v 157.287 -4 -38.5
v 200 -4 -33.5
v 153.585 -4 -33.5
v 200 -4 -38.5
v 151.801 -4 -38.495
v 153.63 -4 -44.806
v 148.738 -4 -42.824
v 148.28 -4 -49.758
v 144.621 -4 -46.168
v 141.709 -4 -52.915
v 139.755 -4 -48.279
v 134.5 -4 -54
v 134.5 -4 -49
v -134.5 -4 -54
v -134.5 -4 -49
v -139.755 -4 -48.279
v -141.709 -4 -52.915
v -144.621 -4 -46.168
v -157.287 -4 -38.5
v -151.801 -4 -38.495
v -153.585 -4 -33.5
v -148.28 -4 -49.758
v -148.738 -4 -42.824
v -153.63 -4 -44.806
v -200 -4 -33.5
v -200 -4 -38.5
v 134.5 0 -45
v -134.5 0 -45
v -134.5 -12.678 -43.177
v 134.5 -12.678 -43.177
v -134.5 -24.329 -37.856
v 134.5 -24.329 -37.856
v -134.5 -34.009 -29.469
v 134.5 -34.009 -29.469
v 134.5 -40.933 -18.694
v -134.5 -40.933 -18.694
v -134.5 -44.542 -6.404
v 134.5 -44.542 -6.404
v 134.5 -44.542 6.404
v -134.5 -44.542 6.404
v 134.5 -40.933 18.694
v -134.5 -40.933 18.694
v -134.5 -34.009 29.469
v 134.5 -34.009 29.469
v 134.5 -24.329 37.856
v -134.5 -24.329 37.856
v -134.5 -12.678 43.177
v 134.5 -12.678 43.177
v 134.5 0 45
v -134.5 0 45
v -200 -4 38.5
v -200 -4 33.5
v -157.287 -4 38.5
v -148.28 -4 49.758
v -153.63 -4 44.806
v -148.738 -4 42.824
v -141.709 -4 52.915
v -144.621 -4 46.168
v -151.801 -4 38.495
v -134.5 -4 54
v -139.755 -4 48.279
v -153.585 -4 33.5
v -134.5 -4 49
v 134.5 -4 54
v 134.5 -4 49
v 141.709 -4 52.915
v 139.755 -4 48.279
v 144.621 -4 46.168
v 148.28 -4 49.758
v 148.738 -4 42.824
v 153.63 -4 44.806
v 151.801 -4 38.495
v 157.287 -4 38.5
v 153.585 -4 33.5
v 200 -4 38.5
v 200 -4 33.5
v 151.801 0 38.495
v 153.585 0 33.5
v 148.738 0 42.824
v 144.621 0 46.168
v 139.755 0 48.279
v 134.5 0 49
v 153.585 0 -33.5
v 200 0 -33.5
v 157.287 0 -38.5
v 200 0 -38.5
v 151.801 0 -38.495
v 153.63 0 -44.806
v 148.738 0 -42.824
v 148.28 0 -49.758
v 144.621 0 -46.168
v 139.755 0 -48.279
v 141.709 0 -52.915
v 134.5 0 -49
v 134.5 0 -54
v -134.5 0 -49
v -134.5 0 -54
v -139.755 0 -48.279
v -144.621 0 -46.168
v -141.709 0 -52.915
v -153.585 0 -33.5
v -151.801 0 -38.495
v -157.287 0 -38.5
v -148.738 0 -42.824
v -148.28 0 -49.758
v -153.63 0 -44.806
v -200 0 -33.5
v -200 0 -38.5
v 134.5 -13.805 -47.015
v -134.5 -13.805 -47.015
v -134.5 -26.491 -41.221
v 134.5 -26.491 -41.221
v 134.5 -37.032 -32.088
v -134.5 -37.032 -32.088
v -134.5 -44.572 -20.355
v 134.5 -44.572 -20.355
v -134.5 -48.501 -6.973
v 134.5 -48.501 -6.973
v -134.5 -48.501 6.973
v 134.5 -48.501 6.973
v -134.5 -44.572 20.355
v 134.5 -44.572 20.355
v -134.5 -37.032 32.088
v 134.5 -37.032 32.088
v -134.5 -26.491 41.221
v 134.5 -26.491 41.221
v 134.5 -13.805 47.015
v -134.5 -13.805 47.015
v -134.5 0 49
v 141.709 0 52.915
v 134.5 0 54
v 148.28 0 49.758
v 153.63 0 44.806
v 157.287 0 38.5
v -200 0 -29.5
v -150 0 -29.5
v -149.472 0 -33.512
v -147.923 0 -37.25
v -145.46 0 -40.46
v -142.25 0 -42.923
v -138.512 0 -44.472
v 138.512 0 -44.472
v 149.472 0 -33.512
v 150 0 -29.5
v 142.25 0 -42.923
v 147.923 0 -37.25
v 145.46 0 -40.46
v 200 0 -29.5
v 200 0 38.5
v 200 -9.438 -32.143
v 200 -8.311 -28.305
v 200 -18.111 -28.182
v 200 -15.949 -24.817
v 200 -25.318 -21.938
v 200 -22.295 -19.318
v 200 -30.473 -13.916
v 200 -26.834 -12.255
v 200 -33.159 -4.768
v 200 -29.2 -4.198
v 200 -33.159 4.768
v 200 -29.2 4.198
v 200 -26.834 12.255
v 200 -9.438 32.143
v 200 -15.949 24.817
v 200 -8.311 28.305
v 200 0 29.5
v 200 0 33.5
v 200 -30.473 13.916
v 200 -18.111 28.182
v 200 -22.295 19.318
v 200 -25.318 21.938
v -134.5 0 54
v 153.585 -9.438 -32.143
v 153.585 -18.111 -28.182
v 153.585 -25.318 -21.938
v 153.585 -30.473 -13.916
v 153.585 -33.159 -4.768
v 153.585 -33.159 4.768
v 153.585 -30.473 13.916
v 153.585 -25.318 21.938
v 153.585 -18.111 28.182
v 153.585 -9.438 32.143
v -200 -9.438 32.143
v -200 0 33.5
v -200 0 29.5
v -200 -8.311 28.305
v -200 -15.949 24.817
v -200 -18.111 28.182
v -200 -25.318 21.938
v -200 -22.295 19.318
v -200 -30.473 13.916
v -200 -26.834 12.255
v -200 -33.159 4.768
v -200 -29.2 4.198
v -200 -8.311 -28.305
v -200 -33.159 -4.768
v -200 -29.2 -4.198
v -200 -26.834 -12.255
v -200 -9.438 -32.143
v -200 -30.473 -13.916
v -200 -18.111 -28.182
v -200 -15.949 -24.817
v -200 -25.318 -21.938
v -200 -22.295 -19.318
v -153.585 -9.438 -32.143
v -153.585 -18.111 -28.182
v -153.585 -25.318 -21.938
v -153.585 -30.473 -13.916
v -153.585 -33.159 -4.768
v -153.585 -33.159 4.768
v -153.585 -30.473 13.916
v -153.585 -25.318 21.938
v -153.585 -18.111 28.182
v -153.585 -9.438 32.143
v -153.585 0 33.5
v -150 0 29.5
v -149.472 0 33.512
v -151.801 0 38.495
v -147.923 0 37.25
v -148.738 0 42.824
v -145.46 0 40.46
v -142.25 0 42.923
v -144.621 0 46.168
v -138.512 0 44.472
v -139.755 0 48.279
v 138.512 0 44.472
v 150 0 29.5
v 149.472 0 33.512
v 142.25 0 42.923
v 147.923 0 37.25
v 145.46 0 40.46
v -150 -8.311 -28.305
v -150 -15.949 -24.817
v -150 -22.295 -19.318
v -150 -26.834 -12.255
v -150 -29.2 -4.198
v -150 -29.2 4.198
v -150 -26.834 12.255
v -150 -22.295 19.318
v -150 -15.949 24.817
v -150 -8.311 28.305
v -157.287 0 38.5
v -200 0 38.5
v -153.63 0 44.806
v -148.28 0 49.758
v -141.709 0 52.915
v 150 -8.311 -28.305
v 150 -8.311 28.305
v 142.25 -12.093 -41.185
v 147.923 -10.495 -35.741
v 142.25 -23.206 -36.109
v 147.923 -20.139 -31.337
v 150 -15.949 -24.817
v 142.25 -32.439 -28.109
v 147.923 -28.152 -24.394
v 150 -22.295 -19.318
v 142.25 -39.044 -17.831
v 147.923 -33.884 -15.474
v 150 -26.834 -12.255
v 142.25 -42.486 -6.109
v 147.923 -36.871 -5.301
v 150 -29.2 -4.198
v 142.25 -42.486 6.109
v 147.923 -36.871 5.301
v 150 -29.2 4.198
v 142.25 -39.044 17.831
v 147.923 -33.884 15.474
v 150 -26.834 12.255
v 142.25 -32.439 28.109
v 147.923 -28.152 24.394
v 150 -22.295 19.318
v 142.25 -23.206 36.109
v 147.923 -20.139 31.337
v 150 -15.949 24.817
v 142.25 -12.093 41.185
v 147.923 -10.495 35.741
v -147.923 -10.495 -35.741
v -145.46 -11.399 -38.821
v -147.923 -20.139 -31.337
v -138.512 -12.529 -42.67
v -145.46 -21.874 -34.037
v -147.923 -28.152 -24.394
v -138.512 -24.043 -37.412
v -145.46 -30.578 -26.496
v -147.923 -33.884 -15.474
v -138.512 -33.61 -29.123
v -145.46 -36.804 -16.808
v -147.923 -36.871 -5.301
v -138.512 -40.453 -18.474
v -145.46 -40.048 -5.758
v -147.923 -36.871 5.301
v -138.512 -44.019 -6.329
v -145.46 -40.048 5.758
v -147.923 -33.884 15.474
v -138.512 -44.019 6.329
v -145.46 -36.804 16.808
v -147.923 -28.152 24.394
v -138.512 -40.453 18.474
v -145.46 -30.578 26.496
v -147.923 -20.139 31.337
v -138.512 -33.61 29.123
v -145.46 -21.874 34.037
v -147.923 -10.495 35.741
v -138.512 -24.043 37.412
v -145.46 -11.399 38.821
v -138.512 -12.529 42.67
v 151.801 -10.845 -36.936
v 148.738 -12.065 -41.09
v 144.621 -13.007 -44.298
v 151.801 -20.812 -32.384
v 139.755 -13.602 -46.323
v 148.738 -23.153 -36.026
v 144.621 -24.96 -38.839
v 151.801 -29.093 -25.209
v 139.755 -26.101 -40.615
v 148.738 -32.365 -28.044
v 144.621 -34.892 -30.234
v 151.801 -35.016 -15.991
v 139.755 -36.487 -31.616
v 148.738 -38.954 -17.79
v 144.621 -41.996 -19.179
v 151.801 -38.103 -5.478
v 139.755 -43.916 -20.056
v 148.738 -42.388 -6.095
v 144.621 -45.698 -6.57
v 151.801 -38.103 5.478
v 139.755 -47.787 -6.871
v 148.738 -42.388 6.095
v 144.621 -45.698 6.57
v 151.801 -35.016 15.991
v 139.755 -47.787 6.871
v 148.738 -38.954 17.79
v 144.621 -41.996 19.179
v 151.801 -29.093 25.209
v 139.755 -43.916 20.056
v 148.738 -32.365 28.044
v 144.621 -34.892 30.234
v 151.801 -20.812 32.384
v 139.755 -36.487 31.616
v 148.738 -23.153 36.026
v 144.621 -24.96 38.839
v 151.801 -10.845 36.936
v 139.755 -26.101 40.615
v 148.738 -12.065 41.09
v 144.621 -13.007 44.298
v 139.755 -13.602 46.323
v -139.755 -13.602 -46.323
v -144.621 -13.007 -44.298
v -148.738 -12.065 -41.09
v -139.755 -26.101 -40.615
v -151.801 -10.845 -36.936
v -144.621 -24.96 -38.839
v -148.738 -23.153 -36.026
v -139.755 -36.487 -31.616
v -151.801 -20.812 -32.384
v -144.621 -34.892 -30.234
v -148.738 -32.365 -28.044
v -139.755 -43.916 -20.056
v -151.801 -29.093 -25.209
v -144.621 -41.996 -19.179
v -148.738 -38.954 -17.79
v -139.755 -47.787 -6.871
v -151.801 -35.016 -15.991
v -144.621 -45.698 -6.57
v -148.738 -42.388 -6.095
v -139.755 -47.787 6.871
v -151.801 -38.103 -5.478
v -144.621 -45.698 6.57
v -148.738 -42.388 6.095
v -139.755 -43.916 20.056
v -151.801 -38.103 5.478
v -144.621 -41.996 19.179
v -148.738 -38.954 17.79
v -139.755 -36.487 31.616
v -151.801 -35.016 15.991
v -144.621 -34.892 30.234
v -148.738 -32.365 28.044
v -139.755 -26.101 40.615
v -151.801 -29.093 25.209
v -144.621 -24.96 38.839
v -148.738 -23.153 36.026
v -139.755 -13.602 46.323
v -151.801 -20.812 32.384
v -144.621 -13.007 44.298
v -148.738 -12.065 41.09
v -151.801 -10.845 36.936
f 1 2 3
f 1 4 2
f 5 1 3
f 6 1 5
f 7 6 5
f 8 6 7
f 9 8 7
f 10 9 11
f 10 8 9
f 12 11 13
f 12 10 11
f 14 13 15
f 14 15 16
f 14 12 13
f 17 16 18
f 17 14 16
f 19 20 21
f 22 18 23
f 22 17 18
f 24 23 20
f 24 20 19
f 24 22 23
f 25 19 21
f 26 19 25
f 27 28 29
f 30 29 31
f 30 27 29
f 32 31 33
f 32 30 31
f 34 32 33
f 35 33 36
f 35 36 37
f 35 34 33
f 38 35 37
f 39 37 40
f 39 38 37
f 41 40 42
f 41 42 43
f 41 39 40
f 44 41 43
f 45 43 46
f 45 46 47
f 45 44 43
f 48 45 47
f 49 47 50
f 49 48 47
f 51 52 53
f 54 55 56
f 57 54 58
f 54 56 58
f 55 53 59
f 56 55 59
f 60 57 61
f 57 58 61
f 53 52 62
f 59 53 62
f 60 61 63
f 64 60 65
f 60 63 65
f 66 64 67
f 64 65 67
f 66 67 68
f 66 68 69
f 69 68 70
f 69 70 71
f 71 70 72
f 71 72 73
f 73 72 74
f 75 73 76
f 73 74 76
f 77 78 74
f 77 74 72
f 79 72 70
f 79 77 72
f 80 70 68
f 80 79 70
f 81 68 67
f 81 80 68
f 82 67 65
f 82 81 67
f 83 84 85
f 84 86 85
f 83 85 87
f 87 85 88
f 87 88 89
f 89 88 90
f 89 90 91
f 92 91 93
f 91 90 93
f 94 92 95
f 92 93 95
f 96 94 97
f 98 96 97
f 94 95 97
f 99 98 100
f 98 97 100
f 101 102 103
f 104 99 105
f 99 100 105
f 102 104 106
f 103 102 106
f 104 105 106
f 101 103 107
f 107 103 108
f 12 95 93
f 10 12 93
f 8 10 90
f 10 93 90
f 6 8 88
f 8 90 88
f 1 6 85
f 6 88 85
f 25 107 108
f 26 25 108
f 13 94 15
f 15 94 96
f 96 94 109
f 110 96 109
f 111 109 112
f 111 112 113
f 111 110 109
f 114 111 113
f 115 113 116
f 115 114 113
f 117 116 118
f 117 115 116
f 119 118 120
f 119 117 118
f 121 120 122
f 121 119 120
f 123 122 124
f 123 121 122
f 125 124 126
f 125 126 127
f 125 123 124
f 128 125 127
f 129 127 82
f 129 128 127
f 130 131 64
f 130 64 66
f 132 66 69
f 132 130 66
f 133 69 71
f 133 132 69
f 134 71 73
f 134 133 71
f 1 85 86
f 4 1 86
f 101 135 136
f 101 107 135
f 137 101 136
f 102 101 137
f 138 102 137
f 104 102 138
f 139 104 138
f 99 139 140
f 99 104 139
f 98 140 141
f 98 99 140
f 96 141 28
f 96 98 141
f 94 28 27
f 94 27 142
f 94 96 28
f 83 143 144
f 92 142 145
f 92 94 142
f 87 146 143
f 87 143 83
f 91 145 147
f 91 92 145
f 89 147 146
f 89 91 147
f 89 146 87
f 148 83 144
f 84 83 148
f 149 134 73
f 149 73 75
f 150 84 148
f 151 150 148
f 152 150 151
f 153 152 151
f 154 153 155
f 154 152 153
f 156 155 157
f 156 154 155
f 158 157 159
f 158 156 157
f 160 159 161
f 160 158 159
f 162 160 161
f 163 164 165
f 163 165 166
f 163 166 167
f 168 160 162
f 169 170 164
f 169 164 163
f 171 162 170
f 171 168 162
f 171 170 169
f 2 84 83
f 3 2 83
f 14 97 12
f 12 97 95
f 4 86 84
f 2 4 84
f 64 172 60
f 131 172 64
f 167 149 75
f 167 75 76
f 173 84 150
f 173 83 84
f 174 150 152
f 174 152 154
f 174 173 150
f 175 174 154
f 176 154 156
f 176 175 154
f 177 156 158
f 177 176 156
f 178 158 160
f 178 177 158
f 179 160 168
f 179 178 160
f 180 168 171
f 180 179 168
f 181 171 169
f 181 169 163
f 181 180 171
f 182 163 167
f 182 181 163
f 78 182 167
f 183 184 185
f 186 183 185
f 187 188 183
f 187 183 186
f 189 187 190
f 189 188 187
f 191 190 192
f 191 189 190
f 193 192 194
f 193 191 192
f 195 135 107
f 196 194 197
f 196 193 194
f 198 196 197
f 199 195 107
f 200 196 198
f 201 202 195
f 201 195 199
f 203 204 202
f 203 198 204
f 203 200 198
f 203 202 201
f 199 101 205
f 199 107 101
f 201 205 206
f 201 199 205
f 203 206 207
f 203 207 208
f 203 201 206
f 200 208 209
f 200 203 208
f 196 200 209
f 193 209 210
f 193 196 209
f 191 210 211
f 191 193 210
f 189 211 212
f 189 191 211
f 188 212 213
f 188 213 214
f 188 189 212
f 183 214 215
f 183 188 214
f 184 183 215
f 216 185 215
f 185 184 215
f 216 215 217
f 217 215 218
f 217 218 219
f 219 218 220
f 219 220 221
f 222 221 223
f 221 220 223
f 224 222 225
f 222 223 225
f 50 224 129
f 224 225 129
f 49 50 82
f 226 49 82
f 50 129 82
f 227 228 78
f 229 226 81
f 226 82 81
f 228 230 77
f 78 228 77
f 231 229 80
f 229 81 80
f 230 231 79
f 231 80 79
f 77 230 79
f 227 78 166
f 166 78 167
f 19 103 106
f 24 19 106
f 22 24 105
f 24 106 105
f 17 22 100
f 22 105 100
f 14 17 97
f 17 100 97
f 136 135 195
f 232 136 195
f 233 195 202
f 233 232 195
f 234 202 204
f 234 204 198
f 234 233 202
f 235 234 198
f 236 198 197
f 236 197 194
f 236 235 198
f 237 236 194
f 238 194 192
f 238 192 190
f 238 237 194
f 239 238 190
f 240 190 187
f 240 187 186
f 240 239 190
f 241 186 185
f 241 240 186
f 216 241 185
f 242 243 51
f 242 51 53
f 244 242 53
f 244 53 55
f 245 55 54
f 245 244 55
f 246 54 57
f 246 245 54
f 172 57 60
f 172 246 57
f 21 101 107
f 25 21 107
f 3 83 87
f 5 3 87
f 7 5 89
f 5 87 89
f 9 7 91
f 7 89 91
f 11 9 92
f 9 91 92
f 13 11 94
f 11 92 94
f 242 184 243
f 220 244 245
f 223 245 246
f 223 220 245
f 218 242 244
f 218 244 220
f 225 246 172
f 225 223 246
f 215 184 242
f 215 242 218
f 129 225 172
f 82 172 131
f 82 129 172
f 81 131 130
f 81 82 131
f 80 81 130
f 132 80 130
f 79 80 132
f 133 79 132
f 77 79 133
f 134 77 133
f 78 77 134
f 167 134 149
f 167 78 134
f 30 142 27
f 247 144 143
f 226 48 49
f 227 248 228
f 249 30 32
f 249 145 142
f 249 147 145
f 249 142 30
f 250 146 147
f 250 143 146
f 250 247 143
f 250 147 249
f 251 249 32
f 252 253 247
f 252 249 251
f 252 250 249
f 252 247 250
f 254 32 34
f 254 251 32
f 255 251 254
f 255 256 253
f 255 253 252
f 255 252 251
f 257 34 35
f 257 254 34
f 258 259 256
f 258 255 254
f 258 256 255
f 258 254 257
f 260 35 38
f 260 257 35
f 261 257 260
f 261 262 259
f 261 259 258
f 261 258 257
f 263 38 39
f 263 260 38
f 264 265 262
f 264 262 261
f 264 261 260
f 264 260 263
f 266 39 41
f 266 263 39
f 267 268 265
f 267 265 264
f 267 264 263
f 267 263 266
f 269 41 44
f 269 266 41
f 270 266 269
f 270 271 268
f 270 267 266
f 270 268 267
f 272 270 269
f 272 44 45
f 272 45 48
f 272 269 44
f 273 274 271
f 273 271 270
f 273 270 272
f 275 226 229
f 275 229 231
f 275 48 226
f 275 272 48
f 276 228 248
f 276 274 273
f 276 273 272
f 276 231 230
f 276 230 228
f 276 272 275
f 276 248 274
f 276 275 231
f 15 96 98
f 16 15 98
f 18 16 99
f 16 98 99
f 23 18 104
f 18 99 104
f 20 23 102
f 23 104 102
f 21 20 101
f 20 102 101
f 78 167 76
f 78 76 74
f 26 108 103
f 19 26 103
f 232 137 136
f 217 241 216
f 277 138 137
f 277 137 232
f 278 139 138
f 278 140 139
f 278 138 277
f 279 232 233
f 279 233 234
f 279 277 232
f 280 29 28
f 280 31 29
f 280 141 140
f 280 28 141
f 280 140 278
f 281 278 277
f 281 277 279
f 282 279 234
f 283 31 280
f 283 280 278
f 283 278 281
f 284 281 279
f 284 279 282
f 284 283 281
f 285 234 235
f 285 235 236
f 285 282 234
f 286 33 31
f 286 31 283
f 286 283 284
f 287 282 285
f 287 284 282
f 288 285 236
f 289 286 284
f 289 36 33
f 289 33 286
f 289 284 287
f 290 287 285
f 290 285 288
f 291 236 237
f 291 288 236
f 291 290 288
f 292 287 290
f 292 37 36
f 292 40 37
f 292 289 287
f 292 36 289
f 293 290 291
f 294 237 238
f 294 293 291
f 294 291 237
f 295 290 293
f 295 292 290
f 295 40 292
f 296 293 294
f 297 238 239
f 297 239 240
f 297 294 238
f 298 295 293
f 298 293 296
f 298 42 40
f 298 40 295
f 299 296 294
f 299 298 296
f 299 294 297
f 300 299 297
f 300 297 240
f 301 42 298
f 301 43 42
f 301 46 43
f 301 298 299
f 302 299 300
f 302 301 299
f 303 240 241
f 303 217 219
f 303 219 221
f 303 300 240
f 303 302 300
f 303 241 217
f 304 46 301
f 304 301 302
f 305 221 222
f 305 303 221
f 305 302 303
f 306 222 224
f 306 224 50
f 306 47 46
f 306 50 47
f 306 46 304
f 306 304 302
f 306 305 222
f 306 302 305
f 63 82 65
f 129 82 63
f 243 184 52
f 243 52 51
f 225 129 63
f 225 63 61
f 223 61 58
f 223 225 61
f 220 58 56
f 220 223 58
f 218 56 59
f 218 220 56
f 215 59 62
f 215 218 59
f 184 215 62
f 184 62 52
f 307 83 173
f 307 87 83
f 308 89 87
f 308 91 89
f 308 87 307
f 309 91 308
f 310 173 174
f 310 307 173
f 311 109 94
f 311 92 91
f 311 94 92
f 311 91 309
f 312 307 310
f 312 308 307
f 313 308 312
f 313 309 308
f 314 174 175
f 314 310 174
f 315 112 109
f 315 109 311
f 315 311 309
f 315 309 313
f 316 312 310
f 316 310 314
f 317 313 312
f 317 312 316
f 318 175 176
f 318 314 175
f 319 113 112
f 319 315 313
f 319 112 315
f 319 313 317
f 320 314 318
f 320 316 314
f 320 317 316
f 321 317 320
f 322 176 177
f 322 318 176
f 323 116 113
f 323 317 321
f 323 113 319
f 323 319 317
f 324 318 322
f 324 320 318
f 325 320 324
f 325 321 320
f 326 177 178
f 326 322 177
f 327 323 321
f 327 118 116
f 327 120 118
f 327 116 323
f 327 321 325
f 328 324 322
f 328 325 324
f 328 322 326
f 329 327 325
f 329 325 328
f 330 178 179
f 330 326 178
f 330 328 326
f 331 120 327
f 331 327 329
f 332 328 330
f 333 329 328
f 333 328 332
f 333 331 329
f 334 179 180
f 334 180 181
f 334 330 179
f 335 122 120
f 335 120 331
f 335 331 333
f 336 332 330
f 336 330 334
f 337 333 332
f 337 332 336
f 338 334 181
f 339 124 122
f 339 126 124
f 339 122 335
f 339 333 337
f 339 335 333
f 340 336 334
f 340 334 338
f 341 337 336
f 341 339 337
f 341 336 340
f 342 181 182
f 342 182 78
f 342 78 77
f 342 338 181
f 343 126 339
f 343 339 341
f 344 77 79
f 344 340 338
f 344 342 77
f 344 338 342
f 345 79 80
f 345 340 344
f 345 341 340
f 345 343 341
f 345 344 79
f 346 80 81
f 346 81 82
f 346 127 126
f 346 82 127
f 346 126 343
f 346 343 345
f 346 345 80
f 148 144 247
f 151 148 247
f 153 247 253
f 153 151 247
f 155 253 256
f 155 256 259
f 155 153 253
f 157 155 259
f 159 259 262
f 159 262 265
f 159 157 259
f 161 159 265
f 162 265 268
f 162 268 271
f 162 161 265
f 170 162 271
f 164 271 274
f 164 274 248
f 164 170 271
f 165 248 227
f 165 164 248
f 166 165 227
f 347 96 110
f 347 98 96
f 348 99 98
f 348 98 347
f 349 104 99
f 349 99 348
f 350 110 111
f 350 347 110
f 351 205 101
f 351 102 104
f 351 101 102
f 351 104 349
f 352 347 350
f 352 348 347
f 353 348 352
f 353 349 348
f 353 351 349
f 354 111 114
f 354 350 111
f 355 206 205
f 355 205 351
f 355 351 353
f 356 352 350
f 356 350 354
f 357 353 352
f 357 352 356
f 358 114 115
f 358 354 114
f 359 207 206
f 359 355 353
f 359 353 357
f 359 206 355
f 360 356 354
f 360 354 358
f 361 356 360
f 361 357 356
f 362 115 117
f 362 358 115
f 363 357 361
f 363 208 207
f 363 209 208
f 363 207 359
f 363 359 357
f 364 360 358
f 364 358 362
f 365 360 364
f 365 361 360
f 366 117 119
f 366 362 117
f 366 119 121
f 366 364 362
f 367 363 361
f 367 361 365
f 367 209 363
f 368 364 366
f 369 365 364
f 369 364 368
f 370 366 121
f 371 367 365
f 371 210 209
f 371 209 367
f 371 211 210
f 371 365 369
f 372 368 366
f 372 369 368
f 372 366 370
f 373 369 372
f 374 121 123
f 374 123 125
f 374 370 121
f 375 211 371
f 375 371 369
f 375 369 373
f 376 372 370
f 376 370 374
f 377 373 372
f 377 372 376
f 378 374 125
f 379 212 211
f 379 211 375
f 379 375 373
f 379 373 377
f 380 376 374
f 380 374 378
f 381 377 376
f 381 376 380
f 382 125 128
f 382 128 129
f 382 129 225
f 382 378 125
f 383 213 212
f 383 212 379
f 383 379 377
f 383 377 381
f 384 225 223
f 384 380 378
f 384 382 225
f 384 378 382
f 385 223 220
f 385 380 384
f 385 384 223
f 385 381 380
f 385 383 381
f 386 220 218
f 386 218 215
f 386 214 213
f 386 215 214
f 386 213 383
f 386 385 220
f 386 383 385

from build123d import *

# Parameters (mm, degrees)
REVOLVE1_ANGLE        = 180
BOSS_EXTRUDE2_DEPTH   = 4
BOSS_EXTRUDE2_2_DEPTH = 4


with BuildPart() as part:
    # Sketch1 → Revolve1 (revolve)
    with BuildSketch(Plane(origin=(0, 0, 0), x_dir=(1, 0, 0), z_dir=(0, 1, 0))):
        with BuildLine():
            Line((-200, 29.5), (-150, 29.5))
            ThreePointArc((-150, 29.5), (-145.460155108, 40.460155108), (-134.5, 45))
            Line((-134.5, 45), (134.5, 45))
            ThreePointArc((134.5, 45), (145.460155108, 40.460155108), (150, 29.5))
            Line((150, 29.5), (200, 29.5))
            Line((200, 29.5), (200, 33.5))
            Line((200, 33.5), (153.585334684, 33.5))
            ThreePointArc((153.585334684, 33.5), (146.793290853, 44.636875503), (134.5, 49))
            Line((134.5, 49), (-134.5, 49))
            ThreePointArc((-134.5, 49), (-146.793290853, 44.636875503), (-153.585334684, 33.5))
            Line((-153.585334684, 33.5), (-200, 33.5))
            Line((-200, 33.5), (-200, 29.5))
        make_face()
    revolve(axis=Axis((0, 0, 0), (-1, 0, 0)), revolution_arc=REVOLVE1_ANGLE)


with BuildPart() as body_2:
    # Sketch3 → Boss-Extrude2 (new body)
    with BuildSketch(Plane(origin=(0, 0, 0), x_dir=(1, 0, 0), z_dir=(0, 1, 0))):
        with BuildLine():
            Line((200, 33.5), (153.585334684, 33.5))
            ThreePointArc((153.585334684, 33.5), (146.793290853, 44.636875503), (134.5, 49))
            Line((134.5, 49), (-134.5, 49))
            ThreePointArc((-134.5, 49), (-146.793290853, 44.636875503), (-153.585334684, 33.5))
            Line((-153.585334684, 33.5), (-200, 33.5))
            Line((-200, 33.5), (-200, 38.5))
            Line((-200, 38.5), (-157.28705773, 38.5))
            ThreePointArc((-157.28705773, 38.5), (-148.27951378, 49.75771458), (-134.5, 54))
            Line((-134.5, 54), (134.5, 54))
            ThreePointArc((134.5, 54), (148.27951378, 49.75771458), (157.28705773, 38.5))
            Line((157.28705773, 38.5), (200, 38.5))
            Line((200, 38.5), (200, 33.5))
        make_face()
    extrude(amount=-BOSS_EXTRUDE2_DEPTH)


with BuildPart() as body_3:
    # Sketch3 → Boss-Extrude2 2 (new body)
    with BuildSketch(Plane(origin=(0, 0, 0), x_dir=(1, 0, 0), z_dir=(0, 1, 0))):
        with BuildLine():
            Line((200, -38.5), (200, -33.5))
            Line((200, -33.5), (153.585334684, -33.5))
            ThreePointArc((153.585334684, -33.5), (146.793290853, -44.636875503), (134.5, -49))
            Line((134.5, -49), (-134.5, -49))
            ThreePointArc((-134.5, -49), (-146.793290853, -44.636875503), (-153.585334684, -33.5))
            Line((-153.585334684, -33.5), (-200, -33.5))
            Line((-200, -33.5), (-200, -38.5))
            Line((-200, -38.5), (-157.28705773, -38.5))
            ThreePointArc((-157.28705773, -38.5), (-148.27951378, -49.75771458), (-134.5, -54))
            Line((-134.5, -54), (134.5, -54))
            ThreePointArc((134.5, -54), (148.27951378, -49.75771458), (157.28705773, -38.5))
            Line((157.28705773, -38.5), (200, -38.5))
        make_face()
    extrude(amount=-BOSS_EXTRUDE2_2_DEPTH)


solid = Compound([part.part, body_2.part, body_3.part])
